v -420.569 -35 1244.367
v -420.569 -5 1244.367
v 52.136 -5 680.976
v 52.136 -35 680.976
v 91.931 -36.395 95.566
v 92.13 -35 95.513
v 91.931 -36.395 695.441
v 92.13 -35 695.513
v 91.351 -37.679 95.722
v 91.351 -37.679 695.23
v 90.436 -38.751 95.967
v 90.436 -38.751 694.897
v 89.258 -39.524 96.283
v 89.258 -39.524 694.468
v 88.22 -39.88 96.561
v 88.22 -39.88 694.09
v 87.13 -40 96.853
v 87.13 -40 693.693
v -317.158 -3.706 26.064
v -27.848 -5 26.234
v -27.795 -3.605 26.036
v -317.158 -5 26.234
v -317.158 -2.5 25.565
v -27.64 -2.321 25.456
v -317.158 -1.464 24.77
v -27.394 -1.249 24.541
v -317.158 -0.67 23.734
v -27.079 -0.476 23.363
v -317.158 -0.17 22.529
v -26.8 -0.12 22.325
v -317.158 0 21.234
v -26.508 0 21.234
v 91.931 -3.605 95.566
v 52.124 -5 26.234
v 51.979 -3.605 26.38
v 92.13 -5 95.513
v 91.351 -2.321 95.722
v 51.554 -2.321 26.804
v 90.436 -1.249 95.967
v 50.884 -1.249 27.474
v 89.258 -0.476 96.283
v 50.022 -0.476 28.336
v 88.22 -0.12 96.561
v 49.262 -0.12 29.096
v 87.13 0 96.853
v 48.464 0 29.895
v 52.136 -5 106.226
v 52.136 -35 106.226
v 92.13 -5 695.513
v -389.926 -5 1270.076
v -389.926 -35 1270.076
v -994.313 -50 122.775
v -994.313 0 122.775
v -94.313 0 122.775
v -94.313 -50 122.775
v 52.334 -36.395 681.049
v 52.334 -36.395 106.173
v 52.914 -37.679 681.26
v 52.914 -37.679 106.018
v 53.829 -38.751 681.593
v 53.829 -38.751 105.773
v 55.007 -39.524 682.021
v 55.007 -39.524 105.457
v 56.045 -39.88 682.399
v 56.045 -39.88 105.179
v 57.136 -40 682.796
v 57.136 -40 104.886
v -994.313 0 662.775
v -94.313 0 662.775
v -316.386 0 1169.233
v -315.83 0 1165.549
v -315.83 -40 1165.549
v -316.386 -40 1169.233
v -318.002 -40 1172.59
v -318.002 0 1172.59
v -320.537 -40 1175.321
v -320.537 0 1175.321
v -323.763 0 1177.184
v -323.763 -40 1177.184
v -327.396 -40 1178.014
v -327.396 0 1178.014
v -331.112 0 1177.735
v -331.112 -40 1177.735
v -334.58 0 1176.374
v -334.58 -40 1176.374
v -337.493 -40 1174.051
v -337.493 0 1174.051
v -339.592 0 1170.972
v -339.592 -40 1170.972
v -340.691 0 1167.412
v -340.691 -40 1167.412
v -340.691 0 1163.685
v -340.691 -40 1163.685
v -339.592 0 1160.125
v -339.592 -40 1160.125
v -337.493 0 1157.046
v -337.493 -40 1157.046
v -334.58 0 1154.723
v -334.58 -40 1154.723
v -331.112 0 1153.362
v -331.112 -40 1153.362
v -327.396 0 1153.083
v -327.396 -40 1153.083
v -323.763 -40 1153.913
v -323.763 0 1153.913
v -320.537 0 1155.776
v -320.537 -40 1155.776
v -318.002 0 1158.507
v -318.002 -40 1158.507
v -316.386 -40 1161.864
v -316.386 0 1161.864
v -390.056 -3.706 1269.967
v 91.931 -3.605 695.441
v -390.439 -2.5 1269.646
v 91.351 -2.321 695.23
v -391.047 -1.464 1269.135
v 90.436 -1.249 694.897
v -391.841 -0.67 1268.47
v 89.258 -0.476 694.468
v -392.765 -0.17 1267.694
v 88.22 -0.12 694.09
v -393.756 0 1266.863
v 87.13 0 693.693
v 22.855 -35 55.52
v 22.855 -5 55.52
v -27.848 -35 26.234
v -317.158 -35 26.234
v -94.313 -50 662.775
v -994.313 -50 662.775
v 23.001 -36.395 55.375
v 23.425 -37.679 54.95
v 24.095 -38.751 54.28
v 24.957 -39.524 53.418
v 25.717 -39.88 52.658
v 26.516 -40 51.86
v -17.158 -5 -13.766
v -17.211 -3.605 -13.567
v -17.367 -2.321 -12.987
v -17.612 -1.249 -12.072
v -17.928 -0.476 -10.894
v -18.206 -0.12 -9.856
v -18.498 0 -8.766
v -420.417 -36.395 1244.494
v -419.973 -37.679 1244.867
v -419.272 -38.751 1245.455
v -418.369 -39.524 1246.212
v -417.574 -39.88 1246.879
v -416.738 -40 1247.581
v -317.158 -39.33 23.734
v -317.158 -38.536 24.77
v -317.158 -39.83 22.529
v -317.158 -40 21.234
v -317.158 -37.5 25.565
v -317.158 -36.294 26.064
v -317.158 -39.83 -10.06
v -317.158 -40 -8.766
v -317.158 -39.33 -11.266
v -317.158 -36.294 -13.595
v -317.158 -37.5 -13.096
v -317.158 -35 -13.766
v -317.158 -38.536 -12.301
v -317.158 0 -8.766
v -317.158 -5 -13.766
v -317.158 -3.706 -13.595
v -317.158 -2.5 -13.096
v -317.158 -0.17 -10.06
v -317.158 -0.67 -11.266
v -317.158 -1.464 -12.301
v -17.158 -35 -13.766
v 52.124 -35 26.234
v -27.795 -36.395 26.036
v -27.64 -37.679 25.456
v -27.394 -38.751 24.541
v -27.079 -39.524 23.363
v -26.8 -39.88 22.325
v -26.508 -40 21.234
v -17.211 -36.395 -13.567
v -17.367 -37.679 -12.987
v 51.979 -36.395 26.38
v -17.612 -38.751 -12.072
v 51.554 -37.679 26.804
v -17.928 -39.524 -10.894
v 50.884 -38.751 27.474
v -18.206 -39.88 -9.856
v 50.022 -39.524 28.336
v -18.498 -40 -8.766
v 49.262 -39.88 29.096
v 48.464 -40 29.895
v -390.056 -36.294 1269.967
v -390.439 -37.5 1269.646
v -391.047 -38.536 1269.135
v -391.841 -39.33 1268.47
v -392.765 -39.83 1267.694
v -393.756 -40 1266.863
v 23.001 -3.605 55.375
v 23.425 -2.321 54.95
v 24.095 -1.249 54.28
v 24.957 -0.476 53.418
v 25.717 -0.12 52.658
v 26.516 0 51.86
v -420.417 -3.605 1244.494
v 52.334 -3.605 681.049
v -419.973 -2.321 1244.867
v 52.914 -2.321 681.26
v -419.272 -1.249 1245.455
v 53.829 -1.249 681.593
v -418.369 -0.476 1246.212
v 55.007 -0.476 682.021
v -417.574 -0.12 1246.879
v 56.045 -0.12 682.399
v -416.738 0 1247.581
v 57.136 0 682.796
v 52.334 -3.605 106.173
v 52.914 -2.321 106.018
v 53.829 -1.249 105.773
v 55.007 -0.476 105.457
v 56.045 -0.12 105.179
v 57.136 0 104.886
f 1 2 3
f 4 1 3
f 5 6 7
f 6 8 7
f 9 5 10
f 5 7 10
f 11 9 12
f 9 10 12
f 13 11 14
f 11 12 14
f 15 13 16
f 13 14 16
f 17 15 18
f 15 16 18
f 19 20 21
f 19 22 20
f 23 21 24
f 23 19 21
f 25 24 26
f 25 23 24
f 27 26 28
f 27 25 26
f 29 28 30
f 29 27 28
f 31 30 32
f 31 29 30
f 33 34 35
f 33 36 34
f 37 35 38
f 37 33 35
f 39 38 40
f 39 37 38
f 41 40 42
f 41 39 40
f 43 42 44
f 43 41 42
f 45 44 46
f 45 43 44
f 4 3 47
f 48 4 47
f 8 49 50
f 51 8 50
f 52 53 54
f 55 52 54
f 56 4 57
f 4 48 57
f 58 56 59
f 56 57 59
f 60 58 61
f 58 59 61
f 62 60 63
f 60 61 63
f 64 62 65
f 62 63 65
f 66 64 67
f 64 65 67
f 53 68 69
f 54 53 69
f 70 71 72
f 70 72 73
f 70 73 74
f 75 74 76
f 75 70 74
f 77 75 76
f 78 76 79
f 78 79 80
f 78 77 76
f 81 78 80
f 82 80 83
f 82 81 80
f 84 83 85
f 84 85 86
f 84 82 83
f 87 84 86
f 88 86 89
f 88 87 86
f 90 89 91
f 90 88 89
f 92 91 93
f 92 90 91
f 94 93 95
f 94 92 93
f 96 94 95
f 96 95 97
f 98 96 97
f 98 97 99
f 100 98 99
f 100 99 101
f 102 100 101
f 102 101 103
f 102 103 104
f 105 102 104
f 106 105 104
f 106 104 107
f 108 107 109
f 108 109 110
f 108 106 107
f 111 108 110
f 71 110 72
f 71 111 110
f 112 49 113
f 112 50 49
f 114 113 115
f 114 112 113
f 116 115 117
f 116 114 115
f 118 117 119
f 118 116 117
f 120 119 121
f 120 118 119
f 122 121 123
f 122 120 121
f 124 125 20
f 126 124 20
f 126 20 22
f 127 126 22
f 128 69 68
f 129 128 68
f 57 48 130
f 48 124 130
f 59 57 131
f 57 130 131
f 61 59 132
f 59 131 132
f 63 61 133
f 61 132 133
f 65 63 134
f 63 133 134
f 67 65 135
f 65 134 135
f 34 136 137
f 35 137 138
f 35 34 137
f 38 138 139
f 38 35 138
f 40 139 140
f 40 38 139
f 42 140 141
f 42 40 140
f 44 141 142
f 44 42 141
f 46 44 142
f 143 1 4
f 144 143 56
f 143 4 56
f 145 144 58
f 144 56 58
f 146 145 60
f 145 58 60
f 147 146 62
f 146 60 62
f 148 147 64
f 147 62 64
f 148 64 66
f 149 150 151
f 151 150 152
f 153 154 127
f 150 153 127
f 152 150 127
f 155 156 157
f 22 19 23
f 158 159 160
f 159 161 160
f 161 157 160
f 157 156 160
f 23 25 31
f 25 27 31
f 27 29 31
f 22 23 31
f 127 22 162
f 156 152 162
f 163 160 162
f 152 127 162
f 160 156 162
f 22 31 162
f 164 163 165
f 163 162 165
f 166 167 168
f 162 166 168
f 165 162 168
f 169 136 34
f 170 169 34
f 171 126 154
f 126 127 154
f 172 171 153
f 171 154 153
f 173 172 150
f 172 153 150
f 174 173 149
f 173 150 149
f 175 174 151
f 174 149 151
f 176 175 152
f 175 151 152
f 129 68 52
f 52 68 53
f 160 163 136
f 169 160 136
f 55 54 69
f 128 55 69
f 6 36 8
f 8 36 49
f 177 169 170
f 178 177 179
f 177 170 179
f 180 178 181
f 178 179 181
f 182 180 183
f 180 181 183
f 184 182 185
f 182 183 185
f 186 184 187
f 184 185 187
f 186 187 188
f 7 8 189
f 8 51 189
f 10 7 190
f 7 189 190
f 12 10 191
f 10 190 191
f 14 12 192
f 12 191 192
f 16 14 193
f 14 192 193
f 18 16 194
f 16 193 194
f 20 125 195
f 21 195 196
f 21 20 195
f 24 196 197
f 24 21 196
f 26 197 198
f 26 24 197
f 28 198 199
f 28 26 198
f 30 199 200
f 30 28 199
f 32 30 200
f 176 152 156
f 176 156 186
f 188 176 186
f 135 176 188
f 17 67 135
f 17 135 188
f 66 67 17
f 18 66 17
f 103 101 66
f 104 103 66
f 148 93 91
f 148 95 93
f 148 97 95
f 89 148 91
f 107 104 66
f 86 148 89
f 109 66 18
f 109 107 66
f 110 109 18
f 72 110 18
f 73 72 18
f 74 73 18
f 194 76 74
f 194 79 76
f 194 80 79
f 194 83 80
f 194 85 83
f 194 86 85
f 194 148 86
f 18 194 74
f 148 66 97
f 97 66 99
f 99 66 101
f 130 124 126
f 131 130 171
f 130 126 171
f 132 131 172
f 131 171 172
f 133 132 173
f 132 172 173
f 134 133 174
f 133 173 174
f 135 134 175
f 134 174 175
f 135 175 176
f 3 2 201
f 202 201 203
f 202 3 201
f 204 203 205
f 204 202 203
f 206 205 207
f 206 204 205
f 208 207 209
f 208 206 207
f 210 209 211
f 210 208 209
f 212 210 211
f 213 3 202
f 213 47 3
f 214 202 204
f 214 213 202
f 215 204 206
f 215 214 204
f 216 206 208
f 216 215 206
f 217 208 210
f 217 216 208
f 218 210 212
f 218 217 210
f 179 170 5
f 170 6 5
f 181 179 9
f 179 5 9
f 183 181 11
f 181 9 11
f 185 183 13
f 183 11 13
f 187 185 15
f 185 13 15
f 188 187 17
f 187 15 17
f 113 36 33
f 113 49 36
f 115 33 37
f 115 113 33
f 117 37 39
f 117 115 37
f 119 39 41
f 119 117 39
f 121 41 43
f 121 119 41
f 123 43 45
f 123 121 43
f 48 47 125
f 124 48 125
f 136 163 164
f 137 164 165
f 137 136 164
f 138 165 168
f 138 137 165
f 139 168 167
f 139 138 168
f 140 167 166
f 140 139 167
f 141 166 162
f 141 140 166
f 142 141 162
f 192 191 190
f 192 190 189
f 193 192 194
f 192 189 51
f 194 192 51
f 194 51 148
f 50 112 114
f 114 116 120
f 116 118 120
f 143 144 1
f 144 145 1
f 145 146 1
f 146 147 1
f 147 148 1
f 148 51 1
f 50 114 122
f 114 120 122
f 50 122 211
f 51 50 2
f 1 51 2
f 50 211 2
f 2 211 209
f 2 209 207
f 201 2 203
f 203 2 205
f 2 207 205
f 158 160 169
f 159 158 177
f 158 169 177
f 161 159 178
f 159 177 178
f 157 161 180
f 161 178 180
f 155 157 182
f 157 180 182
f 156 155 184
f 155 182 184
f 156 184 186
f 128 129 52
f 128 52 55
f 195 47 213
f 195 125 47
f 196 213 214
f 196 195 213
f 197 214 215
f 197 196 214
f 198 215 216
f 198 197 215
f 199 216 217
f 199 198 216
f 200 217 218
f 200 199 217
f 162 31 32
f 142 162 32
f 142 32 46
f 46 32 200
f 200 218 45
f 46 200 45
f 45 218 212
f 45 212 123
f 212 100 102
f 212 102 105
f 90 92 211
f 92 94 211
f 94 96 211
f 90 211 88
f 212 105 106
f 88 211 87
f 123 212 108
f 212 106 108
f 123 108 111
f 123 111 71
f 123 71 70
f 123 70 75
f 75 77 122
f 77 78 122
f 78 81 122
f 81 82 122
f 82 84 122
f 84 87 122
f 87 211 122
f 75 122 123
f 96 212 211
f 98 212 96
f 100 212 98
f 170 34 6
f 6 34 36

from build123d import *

# Parameters (mm, degrees)
F0_R     = 12.5
F1_DEPTH = 40
F2_R     = 5
F4_DEPTH = 50


with BuildPart() as f1:
    # F0 (on Front) → F1 (new body)
    with BuildSketch(Plane.XZ):
        Polygon((-27.848202, 26.234436), (-317.158202, 26.234436), (-317.158202, -13.765564), (-17.158202, -13.765564), align=None)
        Polygon((22.855404, 55.519863), (-27.848202, 26.234436), (-17.158202, -13.765564), (52.123831, 26.234436), align=None)
        Polygon((52.135741, 106.226407), (22.855404, 55.519863), (52.123831, 26.234436), (92.129537, 95.513174), align=None)
        Polygon((52.135741, 680.976407), (52.135741, 106.226407), (92.129537, 95.513174), (92.129537, 695.513174), align=None)
        Polygon((-420.568888, 1244.36682), (52.135741, 680.976407), (92.129537, 695.513174), (-389.925515, 1270.076423), align=None)
        with Locations((-328.330202, 1165.548519)):
            Circle(F0_R, mode=Mode.SUBTRACT)
    extrude(amount=F1_DEPTH)

    # F2
    f2_edges = [f1.edges().sort_by_distance(p)[0] for p in [
        (-148.897989, -40, 982.794798),
        (-184.216573, 0, 962.671614),
        (-184.216573, -40, 962.671614),
        (-148.897989, 0, 982.794798),
        (52.135741, 0, 393.601407),
        (52.135741, -40, 393.601407),
        (92.129537, 0, 395.513174),
        (-172.503202, -40, 26.234436),
        (37.495573, -40, 80.873135),
        (-2.496399, -40, 40.877149),
        (37.495573, 0, 80.873135),
        (-2.496399, 0, 40.877149),
        (-172.503202, 0, 26.234436),
        (-167.158202, 0, -13.765564),
        (17.482815, 0, 6.234436),
        (72.126684, 0, 60.873805),
        (-167.158202, -40, -13.765564),
        (17.482815, -40, 6.234436),
        (72.126684, -40, 60.873805),
        (92.129537, -40, 395.513174),
    ]]
    fillet(f2_edges, radius=F2_R)


with BuildPart() as f4:
    # F3 (on Front) → F4 (new body)
    with BuildSketch(Plane.XZ):
        Polygon((-516.625106, 122.775279), (-94.312755, 122.775279), (-94.312755, 662.775279), (-994.312755, 662.775279), (-994.312755, 122.775279), align=None)
    extrude(amount=F4_DEPTH)


solid = Compound([f1.part, f4.part])
